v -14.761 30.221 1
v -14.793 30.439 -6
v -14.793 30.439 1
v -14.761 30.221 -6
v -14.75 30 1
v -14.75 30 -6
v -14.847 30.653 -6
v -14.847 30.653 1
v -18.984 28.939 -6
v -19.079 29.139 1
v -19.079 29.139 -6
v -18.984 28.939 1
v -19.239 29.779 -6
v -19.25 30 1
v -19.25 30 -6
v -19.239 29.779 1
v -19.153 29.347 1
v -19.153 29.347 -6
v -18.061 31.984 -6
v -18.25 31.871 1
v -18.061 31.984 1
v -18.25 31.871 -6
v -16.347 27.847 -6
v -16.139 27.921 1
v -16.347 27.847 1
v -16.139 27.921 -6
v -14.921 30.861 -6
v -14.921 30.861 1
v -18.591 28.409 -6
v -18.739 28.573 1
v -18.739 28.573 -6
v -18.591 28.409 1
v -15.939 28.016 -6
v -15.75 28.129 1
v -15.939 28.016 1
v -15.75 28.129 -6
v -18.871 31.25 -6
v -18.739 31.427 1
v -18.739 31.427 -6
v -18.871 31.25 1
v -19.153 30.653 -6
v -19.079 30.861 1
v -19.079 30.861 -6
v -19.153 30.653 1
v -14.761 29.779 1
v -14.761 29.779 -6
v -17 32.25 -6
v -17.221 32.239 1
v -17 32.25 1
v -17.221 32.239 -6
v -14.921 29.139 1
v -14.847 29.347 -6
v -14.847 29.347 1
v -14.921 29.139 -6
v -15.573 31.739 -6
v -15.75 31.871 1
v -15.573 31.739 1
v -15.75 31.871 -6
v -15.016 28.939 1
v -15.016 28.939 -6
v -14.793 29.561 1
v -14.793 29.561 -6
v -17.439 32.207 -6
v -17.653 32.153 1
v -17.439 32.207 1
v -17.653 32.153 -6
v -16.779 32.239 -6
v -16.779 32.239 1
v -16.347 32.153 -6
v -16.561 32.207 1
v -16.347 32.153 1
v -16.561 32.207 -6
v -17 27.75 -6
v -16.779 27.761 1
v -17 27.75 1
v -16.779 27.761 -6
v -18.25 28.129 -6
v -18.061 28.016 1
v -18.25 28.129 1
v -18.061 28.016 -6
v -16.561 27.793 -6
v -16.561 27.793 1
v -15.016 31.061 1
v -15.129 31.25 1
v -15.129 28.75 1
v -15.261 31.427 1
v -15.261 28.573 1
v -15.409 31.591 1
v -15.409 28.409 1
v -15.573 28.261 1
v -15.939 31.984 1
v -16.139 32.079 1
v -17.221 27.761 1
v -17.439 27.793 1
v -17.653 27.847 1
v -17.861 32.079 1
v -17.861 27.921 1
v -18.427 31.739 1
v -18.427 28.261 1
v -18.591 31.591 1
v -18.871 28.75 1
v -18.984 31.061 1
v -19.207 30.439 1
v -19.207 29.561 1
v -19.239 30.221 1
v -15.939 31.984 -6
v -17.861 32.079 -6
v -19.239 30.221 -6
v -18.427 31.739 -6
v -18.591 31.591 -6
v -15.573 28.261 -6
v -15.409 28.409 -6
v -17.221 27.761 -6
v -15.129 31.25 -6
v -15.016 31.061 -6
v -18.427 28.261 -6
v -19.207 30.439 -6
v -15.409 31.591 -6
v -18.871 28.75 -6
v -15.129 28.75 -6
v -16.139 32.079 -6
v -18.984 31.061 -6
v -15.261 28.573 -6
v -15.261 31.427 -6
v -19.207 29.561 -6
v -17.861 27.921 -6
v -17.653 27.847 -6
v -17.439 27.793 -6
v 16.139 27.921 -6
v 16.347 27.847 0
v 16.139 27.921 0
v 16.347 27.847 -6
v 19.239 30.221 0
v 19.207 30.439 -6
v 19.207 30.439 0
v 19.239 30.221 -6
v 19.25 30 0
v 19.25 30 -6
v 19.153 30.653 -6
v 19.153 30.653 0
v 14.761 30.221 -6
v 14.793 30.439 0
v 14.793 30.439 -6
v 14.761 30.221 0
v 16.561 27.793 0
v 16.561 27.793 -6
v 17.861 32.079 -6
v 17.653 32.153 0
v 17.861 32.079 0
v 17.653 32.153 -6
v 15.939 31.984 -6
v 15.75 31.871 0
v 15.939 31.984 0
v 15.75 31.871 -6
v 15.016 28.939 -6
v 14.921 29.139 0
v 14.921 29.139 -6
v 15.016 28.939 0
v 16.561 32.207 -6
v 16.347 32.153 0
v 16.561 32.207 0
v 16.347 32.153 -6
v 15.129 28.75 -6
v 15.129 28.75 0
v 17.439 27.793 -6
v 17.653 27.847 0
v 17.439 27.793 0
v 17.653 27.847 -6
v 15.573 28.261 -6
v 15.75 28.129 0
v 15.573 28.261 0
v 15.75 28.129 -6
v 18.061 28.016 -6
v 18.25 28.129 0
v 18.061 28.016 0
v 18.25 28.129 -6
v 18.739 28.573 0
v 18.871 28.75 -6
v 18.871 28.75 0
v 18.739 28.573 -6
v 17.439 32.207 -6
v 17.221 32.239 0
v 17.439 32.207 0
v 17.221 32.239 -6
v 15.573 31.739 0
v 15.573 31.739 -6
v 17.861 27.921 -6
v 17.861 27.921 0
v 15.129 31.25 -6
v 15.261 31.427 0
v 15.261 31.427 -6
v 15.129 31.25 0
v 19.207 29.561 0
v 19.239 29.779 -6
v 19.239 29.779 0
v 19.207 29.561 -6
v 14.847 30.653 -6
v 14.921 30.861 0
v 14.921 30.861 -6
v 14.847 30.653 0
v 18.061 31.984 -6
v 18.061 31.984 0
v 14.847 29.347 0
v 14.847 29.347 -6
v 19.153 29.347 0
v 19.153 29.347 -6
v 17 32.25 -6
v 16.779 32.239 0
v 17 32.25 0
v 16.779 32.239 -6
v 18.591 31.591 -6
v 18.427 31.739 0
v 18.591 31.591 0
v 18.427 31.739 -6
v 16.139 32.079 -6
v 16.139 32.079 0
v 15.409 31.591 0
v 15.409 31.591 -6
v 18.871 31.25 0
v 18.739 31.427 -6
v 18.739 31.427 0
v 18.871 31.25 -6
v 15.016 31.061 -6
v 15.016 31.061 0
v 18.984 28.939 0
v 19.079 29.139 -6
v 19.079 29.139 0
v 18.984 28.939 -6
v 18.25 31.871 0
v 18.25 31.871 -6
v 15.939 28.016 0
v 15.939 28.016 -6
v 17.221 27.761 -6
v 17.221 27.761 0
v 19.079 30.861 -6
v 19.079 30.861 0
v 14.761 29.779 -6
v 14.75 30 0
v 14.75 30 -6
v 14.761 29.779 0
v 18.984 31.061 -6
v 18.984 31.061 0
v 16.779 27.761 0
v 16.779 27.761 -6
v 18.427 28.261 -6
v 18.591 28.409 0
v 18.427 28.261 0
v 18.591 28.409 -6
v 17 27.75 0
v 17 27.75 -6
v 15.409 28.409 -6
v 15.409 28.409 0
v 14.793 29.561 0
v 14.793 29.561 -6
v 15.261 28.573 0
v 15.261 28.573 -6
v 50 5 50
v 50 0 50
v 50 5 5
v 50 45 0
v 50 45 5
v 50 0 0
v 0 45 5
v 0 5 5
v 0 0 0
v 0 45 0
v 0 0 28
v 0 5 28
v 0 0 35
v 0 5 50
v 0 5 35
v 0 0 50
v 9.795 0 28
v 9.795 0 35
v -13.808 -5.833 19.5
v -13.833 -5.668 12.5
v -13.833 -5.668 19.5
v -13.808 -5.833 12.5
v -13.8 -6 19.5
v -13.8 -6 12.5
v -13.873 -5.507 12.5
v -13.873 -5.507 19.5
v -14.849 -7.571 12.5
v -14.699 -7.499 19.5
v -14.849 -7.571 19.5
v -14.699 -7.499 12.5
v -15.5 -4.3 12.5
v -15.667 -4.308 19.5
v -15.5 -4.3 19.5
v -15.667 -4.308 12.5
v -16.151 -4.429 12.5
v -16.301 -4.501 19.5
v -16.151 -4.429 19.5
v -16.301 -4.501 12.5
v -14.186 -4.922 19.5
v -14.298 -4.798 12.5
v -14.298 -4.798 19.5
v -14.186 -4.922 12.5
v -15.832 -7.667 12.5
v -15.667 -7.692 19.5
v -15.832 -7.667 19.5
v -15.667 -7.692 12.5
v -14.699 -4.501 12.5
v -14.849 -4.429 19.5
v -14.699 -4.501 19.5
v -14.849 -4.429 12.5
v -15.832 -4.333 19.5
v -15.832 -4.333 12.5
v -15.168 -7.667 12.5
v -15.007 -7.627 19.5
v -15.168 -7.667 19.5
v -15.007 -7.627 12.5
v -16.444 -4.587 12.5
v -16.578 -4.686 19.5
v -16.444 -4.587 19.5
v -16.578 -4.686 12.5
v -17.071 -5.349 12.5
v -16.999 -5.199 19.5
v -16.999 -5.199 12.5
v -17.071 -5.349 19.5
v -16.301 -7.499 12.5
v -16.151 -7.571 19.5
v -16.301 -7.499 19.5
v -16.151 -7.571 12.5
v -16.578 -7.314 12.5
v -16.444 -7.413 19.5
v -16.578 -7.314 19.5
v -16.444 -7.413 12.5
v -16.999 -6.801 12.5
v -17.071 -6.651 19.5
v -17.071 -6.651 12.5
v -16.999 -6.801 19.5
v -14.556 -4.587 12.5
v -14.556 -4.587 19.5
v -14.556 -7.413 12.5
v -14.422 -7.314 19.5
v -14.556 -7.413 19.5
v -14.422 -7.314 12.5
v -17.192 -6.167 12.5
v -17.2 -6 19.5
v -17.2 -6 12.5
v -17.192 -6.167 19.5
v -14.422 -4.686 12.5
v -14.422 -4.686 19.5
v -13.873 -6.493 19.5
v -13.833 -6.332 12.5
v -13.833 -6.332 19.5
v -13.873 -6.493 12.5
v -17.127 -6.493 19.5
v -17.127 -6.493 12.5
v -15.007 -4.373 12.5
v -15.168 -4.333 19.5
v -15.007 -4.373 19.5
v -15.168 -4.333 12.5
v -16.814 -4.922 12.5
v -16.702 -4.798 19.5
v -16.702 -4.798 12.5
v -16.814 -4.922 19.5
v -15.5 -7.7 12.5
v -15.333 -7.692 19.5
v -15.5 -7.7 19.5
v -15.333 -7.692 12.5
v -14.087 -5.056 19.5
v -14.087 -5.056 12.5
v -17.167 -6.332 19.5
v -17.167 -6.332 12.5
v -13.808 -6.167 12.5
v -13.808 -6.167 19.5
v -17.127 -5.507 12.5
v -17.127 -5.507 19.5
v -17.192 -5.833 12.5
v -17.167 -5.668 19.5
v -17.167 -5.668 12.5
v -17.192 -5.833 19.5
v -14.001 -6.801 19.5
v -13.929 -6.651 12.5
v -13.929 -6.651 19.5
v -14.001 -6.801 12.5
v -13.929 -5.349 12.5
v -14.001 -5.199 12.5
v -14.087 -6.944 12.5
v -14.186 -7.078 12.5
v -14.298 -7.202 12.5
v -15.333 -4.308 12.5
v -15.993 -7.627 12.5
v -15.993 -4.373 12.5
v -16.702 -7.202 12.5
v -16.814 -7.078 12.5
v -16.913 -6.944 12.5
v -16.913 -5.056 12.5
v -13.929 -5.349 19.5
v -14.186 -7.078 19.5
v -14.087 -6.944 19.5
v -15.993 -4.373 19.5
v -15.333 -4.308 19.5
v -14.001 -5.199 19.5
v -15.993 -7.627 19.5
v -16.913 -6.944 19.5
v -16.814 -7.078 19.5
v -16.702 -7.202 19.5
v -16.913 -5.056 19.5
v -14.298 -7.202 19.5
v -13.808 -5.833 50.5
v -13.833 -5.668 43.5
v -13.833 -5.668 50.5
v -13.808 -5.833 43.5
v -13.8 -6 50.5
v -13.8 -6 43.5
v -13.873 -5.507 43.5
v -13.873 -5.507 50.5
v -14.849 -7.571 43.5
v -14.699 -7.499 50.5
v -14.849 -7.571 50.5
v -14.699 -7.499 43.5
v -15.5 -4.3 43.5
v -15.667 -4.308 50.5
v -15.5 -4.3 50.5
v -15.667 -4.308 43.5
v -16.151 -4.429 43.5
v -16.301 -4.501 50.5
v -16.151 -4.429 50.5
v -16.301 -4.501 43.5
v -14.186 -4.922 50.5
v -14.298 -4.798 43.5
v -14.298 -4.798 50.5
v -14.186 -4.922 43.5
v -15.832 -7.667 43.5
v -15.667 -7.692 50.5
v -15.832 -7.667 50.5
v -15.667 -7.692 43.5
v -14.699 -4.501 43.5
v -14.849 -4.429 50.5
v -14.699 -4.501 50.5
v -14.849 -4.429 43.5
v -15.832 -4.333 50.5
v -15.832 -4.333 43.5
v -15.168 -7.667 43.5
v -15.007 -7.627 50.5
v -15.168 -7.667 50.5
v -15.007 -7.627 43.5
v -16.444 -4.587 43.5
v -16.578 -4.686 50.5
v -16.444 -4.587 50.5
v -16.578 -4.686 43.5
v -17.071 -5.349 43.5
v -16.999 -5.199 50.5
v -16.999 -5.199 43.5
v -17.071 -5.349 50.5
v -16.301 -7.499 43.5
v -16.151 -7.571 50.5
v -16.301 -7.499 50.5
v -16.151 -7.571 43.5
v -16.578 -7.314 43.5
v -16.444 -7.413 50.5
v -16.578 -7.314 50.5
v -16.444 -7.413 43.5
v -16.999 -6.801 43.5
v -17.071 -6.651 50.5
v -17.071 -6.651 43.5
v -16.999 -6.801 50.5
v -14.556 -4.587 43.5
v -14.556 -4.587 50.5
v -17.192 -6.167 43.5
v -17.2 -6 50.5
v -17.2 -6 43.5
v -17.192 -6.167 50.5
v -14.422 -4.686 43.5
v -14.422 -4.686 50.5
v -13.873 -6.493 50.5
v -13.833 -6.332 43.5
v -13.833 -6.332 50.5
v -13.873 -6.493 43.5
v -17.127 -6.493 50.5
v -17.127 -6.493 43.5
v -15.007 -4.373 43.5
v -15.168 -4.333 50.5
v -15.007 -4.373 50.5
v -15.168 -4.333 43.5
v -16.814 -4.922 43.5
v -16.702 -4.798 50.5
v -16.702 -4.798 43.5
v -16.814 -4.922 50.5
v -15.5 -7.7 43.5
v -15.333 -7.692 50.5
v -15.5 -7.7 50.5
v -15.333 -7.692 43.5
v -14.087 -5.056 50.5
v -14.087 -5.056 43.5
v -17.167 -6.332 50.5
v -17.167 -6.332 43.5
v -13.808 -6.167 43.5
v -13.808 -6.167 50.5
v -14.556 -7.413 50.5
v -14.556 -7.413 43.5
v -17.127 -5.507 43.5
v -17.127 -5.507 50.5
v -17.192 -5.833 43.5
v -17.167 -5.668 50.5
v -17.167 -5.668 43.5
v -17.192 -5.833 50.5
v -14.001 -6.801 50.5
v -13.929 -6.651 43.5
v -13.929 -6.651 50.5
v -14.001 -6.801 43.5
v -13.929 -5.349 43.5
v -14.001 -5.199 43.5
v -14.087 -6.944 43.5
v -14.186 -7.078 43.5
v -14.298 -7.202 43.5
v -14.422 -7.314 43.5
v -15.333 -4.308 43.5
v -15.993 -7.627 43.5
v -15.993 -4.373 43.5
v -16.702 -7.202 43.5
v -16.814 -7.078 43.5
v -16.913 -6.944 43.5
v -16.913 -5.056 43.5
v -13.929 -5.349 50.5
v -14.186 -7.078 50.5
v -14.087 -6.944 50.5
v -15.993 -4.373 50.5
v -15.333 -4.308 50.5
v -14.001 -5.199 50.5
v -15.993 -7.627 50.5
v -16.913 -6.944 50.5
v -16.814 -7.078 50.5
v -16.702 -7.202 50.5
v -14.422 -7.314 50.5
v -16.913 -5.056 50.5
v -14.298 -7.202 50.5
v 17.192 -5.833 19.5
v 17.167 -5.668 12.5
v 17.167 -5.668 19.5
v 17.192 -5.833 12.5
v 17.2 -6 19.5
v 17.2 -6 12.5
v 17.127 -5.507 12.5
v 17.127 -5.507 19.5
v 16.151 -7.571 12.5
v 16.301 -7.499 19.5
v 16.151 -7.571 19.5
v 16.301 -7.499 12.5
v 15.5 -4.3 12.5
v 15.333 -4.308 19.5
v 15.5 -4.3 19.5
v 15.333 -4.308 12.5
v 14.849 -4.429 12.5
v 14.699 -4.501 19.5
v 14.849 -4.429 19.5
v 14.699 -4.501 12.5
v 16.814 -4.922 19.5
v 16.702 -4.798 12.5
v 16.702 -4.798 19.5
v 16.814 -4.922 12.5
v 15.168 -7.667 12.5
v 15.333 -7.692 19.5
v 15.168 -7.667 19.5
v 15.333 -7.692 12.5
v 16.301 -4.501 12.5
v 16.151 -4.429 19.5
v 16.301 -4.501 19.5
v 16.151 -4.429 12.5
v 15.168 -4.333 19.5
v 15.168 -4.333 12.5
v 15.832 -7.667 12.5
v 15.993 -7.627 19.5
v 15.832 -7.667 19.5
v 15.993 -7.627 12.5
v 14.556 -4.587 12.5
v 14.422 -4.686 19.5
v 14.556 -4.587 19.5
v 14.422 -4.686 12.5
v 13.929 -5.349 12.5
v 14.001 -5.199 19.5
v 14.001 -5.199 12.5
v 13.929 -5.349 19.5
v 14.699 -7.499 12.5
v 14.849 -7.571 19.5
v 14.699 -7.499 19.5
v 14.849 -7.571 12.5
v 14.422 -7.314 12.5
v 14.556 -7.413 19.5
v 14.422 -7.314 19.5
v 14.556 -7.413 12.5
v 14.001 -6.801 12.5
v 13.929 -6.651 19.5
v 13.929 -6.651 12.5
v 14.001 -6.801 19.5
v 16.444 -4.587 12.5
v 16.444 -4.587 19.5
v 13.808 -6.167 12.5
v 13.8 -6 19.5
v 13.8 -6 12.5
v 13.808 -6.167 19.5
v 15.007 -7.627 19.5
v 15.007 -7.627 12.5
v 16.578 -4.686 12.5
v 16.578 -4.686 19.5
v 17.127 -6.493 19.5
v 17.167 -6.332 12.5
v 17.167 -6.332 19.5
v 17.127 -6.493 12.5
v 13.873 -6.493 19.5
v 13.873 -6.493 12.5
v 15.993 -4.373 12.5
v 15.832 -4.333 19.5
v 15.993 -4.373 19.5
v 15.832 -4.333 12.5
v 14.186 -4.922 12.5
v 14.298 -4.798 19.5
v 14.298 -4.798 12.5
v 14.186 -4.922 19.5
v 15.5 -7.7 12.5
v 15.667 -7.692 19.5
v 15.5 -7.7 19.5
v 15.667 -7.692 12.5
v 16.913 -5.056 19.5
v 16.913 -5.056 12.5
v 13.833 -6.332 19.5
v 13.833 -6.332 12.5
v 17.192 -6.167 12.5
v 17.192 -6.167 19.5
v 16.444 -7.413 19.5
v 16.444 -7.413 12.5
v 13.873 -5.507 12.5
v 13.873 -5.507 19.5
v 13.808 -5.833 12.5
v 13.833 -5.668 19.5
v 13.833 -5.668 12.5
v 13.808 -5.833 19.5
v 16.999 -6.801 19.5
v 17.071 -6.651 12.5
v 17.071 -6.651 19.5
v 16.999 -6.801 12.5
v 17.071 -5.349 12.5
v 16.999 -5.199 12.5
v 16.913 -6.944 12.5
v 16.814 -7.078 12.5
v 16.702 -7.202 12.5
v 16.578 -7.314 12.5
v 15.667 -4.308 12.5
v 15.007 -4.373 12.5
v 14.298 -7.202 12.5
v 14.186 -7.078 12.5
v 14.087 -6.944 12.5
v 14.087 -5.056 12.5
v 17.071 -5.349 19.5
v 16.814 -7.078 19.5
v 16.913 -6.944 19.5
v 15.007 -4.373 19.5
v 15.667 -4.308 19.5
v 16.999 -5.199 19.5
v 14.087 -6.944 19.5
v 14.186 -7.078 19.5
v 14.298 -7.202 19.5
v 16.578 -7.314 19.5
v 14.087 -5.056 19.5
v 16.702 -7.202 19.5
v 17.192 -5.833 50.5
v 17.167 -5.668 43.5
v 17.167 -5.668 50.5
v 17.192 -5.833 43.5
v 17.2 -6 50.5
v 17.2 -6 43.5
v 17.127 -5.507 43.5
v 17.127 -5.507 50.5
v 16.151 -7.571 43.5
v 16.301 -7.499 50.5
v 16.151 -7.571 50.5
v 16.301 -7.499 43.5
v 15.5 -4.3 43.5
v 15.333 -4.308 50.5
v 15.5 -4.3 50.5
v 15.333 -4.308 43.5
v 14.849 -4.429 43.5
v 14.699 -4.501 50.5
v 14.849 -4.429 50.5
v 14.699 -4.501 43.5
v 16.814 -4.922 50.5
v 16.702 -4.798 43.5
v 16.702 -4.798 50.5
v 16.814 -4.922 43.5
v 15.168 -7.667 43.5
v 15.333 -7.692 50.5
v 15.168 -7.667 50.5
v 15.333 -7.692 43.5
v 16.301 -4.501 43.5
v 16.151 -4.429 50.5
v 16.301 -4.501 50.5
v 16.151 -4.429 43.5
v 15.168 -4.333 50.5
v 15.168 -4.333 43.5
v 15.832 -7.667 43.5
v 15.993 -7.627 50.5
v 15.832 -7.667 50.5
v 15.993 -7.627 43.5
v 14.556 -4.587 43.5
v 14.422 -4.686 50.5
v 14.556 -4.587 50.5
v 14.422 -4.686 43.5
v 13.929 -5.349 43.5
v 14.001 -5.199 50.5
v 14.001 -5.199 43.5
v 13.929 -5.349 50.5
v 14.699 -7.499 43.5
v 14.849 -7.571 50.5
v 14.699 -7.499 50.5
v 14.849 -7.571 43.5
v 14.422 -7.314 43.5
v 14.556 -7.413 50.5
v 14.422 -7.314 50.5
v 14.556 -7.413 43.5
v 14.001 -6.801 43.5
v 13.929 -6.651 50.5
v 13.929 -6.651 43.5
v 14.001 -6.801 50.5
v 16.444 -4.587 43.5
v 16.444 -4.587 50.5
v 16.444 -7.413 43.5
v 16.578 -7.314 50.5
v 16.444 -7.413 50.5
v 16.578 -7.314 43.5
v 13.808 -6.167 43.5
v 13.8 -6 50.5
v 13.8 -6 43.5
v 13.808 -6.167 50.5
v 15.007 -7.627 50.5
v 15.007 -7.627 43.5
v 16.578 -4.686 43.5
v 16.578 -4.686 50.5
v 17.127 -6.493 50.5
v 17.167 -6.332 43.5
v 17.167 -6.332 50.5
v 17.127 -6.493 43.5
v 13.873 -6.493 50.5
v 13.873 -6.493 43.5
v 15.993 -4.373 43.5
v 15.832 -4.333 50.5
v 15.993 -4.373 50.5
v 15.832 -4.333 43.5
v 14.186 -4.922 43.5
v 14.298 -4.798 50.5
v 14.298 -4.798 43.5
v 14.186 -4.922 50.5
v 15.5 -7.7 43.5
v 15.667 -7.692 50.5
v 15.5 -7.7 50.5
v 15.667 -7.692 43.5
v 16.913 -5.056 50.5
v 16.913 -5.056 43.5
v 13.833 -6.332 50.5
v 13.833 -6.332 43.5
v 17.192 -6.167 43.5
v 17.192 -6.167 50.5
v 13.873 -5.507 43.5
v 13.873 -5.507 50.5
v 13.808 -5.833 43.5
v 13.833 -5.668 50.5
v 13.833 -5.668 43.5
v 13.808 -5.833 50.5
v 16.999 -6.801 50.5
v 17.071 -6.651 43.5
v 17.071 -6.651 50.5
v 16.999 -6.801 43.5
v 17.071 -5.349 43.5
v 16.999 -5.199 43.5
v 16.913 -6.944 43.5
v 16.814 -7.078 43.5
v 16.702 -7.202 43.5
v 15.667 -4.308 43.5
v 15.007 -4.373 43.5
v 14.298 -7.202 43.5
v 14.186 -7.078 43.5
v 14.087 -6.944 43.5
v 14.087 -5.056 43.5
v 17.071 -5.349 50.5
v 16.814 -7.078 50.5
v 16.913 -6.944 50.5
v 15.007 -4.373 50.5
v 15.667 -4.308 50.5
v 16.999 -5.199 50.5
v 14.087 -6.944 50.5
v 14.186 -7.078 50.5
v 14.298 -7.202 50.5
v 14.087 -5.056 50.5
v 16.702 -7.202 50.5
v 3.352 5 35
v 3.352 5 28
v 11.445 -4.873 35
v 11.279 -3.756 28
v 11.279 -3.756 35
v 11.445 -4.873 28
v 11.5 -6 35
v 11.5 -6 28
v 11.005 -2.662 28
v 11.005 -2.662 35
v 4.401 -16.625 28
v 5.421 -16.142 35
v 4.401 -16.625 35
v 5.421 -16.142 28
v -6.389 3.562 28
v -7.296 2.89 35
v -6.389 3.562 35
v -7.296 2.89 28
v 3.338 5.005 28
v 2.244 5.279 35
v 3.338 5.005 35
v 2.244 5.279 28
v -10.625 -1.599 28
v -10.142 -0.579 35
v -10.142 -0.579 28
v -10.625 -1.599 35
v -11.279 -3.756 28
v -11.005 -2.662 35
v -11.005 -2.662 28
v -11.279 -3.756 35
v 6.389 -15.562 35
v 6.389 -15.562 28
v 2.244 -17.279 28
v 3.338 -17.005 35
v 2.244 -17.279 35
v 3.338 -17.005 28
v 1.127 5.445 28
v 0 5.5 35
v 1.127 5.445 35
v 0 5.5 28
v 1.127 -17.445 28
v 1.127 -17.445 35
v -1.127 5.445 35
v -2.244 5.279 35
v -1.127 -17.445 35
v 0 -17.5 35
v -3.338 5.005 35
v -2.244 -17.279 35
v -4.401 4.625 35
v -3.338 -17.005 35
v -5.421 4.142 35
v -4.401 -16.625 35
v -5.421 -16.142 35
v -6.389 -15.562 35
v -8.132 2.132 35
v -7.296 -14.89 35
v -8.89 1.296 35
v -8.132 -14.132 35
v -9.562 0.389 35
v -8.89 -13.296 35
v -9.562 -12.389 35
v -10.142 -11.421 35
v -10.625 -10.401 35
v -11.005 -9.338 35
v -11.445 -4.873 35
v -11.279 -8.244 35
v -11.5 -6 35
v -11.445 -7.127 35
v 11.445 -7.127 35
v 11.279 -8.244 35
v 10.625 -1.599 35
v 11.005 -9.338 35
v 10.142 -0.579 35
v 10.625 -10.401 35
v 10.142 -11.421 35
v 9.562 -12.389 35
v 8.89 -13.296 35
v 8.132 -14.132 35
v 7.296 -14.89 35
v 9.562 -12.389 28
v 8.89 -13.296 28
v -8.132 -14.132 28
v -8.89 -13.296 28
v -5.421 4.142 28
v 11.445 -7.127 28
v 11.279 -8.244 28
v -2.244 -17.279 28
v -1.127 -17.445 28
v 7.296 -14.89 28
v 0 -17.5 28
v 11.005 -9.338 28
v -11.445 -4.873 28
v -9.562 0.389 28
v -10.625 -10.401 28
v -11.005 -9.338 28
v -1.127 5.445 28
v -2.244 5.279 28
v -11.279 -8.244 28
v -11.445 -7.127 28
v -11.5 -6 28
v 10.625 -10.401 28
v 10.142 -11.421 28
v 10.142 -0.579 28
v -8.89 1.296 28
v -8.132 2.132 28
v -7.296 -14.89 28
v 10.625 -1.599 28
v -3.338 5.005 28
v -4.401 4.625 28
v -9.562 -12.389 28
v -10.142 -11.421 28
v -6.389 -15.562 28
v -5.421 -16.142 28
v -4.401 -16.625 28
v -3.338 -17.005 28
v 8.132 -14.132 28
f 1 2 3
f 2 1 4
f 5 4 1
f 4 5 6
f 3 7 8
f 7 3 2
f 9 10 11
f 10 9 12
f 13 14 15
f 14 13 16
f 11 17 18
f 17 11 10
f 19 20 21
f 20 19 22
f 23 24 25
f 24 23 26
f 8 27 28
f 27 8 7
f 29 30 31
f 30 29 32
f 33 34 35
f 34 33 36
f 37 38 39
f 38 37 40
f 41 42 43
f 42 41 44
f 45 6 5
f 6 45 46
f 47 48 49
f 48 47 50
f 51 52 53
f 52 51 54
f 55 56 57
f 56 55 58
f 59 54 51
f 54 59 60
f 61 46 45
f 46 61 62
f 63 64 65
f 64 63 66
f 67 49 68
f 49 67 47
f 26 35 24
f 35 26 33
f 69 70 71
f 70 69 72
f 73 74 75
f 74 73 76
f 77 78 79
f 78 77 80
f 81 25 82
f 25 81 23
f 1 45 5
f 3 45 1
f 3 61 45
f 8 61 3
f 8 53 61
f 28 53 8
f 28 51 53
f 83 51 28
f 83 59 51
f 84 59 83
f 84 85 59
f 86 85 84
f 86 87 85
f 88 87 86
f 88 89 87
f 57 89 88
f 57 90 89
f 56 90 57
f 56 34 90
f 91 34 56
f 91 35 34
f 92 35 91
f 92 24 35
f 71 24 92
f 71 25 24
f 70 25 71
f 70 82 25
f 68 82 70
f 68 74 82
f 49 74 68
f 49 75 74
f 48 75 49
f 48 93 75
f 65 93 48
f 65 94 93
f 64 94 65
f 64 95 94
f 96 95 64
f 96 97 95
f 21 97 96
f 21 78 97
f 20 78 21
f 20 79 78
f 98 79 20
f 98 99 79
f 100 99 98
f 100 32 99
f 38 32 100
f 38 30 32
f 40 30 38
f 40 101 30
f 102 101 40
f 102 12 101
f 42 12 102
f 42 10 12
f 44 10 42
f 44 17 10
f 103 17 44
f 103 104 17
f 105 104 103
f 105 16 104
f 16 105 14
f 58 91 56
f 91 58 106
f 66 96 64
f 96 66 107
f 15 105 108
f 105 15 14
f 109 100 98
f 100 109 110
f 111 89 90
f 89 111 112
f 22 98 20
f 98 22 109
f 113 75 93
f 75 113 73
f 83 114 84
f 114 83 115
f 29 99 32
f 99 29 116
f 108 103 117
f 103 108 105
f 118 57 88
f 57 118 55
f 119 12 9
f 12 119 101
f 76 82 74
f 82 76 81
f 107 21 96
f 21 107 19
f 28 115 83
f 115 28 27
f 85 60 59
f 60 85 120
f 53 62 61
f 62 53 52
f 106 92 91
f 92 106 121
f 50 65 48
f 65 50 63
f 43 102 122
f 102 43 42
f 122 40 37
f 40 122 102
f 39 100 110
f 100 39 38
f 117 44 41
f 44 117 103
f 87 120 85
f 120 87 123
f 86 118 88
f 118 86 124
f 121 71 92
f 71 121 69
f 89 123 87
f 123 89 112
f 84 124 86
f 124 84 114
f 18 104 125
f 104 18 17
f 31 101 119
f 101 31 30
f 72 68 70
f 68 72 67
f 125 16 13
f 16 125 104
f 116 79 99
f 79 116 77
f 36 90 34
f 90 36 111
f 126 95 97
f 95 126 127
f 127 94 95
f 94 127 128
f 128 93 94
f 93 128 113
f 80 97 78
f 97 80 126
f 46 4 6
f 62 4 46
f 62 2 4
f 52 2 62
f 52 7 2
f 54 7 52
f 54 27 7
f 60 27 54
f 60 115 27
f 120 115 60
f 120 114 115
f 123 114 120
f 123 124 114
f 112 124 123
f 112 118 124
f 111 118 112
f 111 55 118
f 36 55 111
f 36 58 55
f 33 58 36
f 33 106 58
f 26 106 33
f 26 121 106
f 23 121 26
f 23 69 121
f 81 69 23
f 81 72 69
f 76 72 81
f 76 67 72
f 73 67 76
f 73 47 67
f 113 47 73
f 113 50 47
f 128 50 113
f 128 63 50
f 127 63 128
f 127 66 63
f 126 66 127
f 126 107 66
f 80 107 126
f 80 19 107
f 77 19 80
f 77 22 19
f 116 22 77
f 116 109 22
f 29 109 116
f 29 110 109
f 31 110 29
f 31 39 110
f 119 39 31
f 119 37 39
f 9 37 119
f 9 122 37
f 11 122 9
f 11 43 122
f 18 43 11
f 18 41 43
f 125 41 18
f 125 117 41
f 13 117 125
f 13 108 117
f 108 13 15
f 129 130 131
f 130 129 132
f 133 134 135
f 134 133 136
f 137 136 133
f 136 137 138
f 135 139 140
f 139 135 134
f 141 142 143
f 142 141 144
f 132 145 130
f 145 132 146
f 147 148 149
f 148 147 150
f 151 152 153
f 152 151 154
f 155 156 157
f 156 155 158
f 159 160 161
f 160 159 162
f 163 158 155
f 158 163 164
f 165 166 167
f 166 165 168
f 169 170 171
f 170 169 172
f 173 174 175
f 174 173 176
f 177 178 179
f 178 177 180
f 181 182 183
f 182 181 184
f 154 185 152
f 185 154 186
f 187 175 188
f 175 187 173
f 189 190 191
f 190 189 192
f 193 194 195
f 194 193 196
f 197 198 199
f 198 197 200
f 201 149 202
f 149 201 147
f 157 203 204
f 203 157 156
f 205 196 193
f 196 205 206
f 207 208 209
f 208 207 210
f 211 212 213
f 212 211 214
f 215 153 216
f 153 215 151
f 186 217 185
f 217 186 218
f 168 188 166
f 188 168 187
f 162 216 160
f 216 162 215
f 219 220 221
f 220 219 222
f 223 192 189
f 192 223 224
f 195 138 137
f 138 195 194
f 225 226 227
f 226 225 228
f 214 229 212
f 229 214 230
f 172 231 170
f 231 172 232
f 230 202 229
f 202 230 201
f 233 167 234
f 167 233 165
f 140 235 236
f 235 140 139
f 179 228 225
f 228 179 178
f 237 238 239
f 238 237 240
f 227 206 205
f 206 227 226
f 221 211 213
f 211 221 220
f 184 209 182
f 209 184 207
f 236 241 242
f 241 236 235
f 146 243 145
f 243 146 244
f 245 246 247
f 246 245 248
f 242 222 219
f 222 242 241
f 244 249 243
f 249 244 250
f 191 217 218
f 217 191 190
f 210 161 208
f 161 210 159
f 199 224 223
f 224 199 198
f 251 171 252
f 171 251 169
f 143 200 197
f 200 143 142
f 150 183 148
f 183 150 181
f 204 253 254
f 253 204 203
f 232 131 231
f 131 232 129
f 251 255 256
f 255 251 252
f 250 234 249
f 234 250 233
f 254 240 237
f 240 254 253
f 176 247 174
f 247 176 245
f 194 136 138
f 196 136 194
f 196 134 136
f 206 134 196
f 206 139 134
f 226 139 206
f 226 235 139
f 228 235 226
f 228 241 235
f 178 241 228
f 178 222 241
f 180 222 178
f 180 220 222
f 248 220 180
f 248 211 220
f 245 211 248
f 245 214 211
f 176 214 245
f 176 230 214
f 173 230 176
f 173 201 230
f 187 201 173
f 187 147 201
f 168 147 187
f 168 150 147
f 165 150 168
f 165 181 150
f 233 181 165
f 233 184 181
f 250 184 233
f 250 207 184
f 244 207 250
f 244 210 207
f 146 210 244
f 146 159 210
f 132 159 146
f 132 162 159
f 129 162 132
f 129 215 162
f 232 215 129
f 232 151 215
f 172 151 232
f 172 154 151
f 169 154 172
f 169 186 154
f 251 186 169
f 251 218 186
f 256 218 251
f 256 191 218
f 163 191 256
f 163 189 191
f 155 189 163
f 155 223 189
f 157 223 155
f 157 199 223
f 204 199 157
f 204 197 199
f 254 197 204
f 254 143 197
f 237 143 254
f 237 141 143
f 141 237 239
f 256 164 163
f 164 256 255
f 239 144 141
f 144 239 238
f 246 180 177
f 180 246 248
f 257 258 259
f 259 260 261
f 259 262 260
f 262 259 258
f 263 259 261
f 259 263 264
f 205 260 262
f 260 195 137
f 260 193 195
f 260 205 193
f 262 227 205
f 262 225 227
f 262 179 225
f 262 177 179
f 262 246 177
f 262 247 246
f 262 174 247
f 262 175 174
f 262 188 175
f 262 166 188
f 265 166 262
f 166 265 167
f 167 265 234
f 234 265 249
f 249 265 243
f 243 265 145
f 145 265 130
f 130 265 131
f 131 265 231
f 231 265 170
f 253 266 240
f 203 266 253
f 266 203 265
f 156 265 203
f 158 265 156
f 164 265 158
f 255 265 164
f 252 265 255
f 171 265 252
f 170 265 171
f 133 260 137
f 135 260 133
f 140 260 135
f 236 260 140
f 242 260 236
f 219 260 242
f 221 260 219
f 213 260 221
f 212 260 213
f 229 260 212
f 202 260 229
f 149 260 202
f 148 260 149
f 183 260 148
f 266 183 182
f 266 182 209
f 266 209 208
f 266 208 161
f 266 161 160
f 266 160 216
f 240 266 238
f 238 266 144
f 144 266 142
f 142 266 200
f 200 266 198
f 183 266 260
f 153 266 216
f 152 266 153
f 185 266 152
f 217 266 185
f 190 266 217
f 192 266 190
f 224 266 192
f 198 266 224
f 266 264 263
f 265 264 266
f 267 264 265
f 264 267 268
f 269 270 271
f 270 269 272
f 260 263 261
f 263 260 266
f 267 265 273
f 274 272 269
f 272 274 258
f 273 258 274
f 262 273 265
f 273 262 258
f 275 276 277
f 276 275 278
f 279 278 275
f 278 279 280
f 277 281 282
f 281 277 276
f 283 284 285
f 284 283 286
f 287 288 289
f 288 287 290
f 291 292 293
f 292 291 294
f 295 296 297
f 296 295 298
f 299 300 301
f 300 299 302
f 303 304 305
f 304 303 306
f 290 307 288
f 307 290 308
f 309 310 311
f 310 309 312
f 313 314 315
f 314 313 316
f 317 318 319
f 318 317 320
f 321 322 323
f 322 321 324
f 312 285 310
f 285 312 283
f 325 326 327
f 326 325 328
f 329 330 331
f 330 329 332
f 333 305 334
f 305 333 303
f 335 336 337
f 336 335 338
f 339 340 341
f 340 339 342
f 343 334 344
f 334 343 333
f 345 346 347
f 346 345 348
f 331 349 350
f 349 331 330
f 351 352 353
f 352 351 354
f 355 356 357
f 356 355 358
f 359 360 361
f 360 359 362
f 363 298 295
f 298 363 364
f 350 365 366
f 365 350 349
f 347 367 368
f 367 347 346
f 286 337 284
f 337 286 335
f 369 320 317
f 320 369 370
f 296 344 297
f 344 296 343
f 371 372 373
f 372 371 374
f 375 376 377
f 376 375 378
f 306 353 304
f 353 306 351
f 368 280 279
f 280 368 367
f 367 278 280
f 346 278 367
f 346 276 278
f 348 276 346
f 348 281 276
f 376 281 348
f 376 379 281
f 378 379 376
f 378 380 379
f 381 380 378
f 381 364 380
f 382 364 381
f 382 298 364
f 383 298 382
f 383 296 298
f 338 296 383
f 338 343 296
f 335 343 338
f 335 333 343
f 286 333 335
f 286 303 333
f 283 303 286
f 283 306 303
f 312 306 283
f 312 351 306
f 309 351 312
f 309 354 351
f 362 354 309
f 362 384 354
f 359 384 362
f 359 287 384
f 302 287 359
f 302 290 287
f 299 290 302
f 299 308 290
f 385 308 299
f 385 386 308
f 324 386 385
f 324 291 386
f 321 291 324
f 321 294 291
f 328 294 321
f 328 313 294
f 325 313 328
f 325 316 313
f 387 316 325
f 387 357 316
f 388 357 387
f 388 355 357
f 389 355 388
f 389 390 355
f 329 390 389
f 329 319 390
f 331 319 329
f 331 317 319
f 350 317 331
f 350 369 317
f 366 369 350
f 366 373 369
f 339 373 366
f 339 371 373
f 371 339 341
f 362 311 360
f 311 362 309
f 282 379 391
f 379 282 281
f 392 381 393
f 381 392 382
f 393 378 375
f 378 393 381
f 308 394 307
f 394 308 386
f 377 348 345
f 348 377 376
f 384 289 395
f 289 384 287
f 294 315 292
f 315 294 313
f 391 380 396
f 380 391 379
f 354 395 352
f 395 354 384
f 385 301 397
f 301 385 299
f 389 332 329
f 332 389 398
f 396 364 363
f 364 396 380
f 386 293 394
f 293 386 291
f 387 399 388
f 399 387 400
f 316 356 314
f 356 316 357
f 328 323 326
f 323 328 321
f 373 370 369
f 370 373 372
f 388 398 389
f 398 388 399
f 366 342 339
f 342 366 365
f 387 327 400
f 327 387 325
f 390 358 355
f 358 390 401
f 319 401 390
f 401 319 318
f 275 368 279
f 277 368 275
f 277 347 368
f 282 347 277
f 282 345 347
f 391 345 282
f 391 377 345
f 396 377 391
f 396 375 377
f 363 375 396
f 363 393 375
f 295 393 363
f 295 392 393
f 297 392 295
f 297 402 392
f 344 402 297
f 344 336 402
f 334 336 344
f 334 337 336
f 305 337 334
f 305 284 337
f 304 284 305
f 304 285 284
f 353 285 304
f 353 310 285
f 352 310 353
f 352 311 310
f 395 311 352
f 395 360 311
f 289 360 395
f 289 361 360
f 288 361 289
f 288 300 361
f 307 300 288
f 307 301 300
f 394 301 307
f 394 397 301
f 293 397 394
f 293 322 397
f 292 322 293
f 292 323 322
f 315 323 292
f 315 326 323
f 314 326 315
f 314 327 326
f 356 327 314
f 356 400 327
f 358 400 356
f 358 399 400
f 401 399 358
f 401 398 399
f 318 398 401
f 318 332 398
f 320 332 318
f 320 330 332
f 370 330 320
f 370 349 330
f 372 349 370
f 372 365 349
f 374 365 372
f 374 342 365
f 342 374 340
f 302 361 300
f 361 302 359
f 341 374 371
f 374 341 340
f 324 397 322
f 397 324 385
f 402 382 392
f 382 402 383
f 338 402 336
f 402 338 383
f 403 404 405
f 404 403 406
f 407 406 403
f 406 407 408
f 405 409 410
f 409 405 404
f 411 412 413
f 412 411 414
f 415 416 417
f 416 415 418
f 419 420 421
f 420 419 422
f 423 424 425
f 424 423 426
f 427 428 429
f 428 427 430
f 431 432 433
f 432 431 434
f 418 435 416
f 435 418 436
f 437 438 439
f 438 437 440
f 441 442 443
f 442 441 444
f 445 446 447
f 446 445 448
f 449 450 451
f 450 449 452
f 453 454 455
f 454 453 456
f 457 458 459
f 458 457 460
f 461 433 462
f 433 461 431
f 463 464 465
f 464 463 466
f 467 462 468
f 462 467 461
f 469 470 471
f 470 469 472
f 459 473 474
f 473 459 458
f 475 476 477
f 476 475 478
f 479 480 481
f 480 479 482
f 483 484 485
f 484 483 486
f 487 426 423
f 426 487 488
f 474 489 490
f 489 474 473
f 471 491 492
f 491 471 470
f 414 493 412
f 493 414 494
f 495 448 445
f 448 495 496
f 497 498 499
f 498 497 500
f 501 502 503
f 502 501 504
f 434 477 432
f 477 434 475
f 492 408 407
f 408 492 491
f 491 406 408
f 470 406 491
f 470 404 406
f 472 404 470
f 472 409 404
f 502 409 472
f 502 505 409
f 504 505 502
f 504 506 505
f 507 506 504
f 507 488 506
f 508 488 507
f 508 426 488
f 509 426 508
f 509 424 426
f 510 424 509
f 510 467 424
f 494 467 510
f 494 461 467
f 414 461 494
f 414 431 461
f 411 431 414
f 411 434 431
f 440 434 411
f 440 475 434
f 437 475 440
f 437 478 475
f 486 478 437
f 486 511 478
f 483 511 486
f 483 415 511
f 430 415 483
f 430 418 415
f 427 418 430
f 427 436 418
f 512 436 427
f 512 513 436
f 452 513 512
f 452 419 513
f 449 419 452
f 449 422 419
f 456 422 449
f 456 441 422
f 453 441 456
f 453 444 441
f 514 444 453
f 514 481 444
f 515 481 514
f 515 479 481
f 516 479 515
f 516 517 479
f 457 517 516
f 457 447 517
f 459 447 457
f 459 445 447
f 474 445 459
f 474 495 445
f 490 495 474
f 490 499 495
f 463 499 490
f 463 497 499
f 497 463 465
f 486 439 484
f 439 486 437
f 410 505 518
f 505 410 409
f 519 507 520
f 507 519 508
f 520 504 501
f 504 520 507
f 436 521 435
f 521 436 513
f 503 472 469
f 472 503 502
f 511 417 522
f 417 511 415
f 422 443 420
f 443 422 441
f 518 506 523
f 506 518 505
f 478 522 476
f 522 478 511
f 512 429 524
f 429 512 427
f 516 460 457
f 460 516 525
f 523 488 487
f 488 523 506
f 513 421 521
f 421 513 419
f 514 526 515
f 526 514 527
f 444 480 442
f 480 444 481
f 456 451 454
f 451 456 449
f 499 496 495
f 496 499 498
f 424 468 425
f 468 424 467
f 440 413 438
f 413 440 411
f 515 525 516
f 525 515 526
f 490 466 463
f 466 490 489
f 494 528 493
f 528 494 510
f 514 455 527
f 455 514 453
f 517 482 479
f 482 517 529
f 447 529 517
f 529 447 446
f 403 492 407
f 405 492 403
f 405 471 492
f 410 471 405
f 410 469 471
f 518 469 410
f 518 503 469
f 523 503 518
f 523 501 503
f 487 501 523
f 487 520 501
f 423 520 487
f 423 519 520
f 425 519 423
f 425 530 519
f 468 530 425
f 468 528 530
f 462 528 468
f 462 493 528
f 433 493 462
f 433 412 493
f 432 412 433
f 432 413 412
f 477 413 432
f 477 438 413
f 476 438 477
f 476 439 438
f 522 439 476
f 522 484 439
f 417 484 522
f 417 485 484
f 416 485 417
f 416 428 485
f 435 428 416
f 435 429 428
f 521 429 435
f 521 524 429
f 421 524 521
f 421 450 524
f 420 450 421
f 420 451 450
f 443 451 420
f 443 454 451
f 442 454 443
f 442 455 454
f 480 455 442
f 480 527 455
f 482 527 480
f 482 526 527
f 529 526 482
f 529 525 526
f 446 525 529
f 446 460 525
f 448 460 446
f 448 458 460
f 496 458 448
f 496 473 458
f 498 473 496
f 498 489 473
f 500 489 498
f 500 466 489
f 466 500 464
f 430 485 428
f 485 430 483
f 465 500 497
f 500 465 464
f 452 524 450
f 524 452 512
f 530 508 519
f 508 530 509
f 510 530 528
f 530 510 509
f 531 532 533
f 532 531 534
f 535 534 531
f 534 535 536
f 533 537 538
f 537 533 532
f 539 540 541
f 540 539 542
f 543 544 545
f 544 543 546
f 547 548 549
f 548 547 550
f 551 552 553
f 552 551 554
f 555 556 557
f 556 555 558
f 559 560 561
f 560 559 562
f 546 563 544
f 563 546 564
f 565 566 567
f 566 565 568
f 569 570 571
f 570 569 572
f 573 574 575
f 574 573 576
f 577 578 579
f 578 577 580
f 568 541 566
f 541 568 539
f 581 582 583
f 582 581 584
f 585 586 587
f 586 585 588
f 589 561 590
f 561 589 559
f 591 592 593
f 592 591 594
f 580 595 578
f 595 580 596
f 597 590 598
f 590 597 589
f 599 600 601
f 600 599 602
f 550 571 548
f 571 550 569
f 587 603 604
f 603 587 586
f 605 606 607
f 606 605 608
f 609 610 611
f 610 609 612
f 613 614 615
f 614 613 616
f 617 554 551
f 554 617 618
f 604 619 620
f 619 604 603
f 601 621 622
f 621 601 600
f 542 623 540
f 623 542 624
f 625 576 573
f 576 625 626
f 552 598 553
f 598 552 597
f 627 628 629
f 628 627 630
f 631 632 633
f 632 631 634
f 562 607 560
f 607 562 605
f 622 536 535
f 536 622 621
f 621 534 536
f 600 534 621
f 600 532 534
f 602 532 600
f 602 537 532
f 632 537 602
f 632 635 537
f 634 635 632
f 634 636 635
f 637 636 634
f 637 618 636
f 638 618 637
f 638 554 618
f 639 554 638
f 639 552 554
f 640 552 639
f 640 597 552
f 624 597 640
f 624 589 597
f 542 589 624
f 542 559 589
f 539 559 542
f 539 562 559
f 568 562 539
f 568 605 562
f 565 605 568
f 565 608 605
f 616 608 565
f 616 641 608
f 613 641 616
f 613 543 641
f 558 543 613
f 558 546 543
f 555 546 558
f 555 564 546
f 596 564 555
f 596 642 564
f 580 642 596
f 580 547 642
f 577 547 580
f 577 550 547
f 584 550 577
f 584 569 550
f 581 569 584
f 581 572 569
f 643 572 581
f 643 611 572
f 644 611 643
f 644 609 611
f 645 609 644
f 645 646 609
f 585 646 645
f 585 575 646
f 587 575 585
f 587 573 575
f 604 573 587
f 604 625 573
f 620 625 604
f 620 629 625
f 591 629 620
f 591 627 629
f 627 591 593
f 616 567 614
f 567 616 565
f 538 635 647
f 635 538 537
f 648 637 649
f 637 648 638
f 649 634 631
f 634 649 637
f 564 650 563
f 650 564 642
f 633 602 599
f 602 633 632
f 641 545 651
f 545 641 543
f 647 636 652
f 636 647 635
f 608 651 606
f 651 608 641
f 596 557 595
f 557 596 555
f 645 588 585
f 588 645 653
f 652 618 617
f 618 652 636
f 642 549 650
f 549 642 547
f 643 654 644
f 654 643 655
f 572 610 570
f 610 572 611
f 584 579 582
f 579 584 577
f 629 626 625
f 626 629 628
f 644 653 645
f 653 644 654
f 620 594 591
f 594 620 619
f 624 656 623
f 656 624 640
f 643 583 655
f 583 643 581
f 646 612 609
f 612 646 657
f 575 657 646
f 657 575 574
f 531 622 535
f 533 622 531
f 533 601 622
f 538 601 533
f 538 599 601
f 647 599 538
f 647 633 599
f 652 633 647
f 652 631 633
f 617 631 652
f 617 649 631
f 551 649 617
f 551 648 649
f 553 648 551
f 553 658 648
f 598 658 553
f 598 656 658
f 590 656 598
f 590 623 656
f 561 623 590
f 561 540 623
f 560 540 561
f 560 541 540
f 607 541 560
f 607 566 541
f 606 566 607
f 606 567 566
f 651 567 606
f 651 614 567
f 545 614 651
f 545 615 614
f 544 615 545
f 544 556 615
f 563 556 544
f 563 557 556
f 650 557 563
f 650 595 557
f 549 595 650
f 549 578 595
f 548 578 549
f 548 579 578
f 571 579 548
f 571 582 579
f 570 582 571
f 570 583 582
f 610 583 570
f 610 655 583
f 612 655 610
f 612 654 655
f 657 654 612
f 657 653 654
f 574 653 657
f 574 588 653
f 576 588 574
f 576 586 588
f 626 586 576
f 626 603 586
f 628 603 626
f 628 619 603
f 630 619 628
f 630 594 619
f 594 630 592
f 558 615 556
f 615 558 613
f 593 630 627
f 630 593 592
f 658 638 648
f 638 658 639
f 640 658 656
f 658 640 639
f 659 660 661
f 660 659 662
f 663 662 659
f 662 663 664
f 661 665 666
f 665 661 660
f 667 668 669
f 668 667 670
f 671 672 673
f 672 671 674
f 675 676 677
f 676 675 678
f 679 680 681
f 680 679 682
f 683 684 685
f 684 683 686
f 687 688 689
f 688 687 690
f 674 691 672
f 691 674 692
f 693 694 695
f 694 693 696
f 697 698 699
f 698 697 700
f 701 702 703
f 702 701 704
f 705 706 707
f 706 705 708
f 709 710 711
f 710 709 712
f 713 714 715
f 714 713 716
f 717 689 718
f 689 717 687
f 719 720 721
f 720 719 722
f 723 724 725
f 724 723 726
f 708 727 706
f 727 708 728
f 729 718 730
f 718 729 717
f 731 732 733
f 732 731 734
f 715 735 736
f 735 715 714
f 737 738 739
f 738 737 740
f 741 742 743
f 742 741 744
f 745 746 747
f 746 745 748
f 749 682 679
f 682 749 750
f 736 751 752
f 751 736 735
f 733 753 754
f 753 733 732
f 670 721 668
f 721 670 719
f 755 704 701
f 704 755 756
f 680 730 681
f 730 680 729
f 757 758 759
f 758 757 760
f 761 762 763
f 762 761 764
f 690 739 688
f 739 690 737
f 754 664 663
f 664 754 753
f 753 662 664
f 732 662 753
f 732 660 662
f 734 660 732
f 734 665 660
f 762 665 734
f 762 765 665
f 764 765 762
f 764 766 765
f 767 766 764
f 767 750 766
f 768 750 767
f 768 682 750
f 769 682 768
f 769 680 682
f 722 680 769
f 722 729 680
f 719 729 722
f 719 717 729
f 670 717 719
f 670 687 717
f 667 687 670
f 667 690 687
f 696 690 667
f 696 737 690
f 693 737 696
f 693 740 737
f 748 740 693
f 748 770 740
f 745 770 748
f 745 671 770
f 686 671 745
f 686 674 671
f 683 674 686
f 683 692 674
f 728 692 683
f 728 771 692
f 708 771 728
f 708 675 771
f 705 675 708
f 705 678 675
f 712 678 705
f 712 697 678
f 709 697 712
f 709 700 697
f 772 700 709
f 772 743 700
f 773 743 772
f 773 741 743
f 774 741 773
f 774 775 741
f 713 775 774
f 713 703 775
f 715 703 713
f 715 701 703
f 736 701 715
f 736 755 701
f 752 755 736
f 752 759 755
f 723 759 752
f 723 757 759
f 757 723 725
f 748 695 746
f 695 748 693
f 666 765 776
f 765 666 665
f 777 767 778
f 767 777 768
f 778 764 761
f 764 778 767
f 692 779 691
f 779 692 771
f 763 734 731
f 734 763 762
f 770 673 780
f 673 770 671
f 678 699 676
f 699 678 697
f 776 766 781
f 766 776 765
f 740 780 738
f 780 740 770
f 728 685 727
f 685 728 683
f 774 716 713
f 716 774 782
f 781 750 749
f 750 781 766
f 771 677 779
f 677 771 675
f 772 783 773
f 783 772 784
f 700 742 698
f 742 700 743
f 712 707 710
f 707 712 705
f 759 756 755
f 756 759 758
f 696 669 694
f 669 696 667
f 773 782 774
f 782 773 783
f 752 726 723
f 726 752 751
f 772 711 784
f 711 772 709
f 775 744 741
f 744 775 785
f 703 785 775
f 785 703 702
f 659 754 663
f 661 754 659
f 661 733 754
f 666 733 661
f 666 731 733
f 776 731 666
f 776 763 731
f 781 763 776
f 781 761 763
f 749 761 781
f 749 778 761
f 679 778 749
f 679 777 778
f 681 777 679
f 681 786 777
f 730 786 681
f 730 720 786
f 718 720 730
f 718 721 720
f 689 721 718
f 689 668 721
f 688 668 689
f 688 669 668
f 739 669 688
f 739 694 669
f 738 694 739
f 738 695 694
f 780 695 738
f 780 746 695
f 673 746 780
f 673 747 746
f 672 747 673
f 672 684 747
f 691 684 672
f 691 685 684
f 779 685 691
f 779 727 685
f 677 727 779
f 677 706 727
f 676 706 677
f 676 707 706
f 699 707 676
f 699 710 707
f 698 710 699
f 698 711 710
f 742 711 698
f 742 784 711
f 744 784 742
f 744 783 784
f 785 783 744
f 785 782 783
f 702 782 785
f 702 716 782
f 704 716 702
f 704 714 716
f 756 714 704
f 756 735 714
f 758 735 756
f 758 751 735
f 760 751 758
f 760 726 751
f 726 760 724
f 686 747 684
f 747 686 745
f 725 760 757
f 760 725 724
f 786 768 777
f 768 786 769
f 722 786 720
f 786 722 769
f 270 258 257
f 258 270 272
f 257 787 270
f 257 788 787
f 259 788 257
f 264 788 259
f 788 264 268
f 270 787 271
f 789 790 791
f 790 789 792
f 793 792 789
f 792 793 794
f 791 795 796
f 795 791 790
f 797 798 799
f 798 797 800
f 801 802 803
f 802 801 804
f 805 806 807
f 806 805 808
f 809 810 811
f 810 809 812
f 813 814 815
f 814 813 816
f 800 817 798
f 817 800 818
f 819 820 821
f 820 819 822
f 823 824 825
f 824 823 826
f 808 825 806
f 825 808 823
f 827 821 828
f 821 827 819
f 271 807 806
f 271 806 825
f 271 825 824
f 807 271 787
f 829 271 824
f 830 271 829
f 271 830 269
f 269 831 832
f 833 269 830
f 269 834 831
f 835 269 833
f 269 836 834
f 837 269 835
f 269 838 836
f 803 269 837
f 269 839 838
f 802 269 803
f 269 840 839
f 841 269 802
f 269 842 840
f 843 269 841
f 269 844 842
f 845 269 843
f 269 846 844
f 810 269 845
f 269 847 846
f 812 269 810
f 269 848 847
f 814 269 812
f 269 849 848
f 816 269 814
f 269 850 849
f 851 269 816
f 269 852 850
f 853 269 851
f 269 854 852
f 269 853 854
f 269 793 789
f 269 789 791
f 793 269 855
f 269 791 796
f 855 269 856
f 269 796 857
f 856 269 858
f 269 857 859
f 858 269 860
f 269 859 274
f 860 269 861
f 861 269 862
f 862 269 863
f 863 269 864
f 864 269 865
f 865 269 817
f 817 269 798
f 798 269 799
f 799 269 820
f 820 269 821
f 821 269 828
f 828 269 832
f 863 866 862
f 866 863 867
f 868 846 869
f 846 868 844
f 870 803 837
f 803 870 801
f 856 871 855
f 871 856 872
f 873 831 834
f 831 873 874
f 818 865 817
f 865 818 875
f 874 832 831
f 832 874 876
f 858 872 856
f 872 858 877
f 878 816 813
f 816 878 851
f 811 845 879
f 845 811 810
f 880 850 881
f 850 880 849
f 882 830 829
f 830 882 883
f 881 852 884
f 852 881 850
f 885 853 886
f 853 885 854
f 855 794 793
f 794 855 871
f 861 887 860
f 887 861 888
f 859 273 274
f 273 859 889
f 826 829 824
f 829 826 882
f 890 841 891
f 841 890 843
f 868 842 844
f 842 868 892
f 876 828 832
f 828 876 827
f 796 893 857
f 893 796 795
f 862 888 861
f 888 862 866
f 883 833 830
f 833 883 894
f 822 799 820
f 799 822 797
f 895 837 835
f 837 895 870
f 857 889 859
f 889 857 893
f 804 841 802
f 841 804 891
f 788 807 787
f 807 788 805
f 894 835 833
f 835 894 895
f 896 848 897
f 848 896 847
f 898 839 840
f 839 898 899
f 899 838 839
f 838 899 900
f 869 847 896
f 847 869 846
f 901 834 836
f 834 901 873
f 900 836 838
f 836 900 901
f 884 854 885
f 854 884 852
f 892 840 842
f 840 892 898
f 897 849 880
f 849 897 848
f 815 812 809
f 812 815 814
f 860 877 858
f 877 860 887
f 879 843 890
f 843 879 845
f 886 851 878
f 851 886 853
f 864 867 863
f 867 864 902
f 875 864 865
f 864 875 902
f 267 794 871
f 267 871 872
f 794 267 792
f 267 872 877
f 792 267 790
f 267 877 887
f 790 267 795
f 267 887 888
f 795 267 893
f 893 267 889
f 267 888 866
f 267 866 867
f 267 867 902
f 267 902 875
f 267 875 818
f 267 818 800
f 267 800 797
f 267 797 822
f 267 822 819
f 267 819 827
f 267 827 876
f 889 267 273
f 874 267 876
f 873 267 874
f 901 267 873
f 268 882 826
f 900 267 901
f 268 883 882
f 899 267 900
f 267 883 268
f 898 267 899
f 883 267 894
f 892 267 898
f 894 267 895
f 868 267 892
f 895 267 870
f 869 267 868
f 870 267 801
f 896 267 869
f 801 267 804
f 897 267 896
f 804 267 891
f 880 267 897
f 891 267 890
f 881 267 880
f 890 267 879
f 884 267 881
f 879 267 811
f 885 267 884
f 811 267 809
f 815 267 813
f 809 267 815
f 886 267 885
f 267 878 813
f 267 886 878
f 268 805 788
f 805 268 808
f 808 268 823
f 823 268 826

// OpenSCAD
$fn = 128;

// --- Base Plate Dimensions ---
// X range: -25 to 25 (Width = 50)
// Y range: 0 to 45 (Length = 45)
// Z range: 0 to 5 (Thickness = 5)
BASE_X_MIN = -25;
BASE_X_MAX = 25;
BASE_Y_MIN = 0;
BASE_Y_MAX = 45;
BASE_Z_MAX = 5;

// --- Base Plate Holes (M4) ---
// Position: x = -17, y = 30 and x = 17, y = 30
// Diameter: 4.5 mm
BASE_HOLE_X_1 = -17;
BASE_HOLE_Y = 30;
BASE_HOLE_X_2 = 17;
BASE_HOLE_DIAMETER = 4.5;

// --- Vertical Motor Plate Dimensions ---
// X range: -25 to 25 (Width = 50)
// Y range: 0 to 5 (Thickness = 5)
// Z range: 0 to 50 (Height = 50)
// Stands on the back edge of the base (y=0)
MOTOR_X_MIN = -25;
MOTOR_X_MAX = 25;
MOTOR_Y_MAX = 5;
MOTOR_Z_MAX = 50;

// --- Motor Plate Boss Hole ---
// Diameter: 23 mm
// Centre: x = 0, z = 28
// Cut along Y axis
BOSS_DIAMETER = 23;
BOSS_X = 0;
BOSS_Z = 28;

// --- Motor Plate Screw Holes (M3) ---
// Diameter: 3.4 mm
// Pattern: 31 mm square, centred on boss hole
// 4 holes total
SCREW_DIAMETER = 3.4;
SCREW_PATTERN_SIZE = 31;

// --- Gusset Dimensions ---
// Thickness: 5 mm (matches base and motor plate)
// Location: Left (x=-25 to -20) and Right (x=20 to 25)
// Shape: Right triangle in YZ plane
// Legs: 20 mm along +Y and 20 mm along +Z
// Right-angle corner at y=5, z=5
GUSSET_THICKNESS = 5;
GUSSET_Y_LEG = 20;
GUSSET_Z_LEG = 20;
GUSSET_CORNER_Y = 5;
GUSSET_CORNER_Z = 5;

// --- Build ---

module base_plate() {
    // Main block
    cube([
        BASE_X_MAX - BASE_X_MIN,
        BASE_Y_MAX - BASE_Y_MIN,
        BASE_Z_MAX
    ], center = false);

    // Cut M4 holes
    for (i = [0, 1]) {
        translate([
            i == 0 ? BASE_HOLE_X_1 : BASE_HOLE_X_2,
            BASE_HOLE_Y,
            -BASE_Z_MAX - 1 // Extend past bottom to ensure clean cut
        ]) {
            cylinder(
                h = BASE_Z_MAX + 2,
                d = BASE_HOLE_DIAMETER,
                $fn = 64
            );
        }
    }
}

module motor_plate() {
    // Main block
    cube([
        MOTOR_X_MAX - MOTOR_X_MIN,
        MOTOR_Y_MAX,
        MOTOR_Z_MAX
    ], center = false);

    // Cut Boss Hole (along Y)
    translate([BOSS_X, -MOTOR_Y_MAX - 1, BOSS_Z]) {
        cylinder(
            h = MOTOR_Y_MAX + 2,
            d = BOSS_DIAMETER,
            $fn = 64
        );
    }

    // Cut Screw Holes (4 holes on 31mm square)
    // Pattern centered at (0, 2.5, BOSS_Z)
    // Square size 31mm -> offset from center is 15.5mm
    // Holes at: x = +/- 15.5, z = BOSS_Z +/- 15.5
    for (x_offset = [-1, 1]) {
        for (z_offset = [-1, 1]) {
            translate([
                x_offset * (SCREW_PATTERN_SIZE / 2),
                -MOTOR_Y_MAX - 1, // Extend past bottom
                BOSS_Z + z_offset * (SCREW_PATTERN_SIZE / 2)
            ]) {
                cylinder(
                    h = MOTOR_Y_MAX + 2,
                    d = SCREW_DIAMETER,
                    $fn = 64
                );
            }
        }
    }
}

module gusset() {
    // Right triangle in YZ plane
    // Right angle at (y=5, z=5)
    // Extends +Y by 20, +Z by 20
    // Thickness in X is 5
    
    // Define vertices for the triangle in YZ plane
    // Corner 1: (5, 5) - Right angle
    // Corner 2: (5 + 20, 5) = (25, 5) - Along Y
    // Corner 3: (5, 5 + 20) = (5, 25) - Along Z
    // Note: The hypotenuse connects (25,5) and (5,25).
    
    // We extrude this triangle along X.
    // The gusset is located at the edges.
    // Left Gusset: X from -25 to -20
    // Right Gusset: X from 20 to 25
    
    // Define the polygon for the triangle
    // Points: (y=5, z=5), (y=25, z=5), (y=5, z=25)
    // Order matters for normal direction, but union handles it.
    // Let's define points relative to the corner (5,5)
    p1 = [5, 5];
    p2 = [5 + GUSSET_Y_LEG, 5];
    p3 = [5, 5 + GUSSET_Z_LEG];
    
    // Extrude along X
    translate([-GUSSET_THICKNESS/2, 0, 0]) {
        polygon(
            points = [
                [0, p1[0], p1[1]],
                [0, p2[0], p2[1]],
                [0, p3[0], p3[1]]
            ],
            extrude_height = GUSSET_THICKNESS
        );
    }
}

// --- Assembly ---
union() {
    base_plate();
    motor_plate();
    
    // Left Gusset (x = -25 to -20)
    translate([-25, 0, 0]) {
        gusset();
    }
    
    // Right Gusset (x = 20 to 25)
    translate([20, 0, 0]) {
        gusset();
    }
}
